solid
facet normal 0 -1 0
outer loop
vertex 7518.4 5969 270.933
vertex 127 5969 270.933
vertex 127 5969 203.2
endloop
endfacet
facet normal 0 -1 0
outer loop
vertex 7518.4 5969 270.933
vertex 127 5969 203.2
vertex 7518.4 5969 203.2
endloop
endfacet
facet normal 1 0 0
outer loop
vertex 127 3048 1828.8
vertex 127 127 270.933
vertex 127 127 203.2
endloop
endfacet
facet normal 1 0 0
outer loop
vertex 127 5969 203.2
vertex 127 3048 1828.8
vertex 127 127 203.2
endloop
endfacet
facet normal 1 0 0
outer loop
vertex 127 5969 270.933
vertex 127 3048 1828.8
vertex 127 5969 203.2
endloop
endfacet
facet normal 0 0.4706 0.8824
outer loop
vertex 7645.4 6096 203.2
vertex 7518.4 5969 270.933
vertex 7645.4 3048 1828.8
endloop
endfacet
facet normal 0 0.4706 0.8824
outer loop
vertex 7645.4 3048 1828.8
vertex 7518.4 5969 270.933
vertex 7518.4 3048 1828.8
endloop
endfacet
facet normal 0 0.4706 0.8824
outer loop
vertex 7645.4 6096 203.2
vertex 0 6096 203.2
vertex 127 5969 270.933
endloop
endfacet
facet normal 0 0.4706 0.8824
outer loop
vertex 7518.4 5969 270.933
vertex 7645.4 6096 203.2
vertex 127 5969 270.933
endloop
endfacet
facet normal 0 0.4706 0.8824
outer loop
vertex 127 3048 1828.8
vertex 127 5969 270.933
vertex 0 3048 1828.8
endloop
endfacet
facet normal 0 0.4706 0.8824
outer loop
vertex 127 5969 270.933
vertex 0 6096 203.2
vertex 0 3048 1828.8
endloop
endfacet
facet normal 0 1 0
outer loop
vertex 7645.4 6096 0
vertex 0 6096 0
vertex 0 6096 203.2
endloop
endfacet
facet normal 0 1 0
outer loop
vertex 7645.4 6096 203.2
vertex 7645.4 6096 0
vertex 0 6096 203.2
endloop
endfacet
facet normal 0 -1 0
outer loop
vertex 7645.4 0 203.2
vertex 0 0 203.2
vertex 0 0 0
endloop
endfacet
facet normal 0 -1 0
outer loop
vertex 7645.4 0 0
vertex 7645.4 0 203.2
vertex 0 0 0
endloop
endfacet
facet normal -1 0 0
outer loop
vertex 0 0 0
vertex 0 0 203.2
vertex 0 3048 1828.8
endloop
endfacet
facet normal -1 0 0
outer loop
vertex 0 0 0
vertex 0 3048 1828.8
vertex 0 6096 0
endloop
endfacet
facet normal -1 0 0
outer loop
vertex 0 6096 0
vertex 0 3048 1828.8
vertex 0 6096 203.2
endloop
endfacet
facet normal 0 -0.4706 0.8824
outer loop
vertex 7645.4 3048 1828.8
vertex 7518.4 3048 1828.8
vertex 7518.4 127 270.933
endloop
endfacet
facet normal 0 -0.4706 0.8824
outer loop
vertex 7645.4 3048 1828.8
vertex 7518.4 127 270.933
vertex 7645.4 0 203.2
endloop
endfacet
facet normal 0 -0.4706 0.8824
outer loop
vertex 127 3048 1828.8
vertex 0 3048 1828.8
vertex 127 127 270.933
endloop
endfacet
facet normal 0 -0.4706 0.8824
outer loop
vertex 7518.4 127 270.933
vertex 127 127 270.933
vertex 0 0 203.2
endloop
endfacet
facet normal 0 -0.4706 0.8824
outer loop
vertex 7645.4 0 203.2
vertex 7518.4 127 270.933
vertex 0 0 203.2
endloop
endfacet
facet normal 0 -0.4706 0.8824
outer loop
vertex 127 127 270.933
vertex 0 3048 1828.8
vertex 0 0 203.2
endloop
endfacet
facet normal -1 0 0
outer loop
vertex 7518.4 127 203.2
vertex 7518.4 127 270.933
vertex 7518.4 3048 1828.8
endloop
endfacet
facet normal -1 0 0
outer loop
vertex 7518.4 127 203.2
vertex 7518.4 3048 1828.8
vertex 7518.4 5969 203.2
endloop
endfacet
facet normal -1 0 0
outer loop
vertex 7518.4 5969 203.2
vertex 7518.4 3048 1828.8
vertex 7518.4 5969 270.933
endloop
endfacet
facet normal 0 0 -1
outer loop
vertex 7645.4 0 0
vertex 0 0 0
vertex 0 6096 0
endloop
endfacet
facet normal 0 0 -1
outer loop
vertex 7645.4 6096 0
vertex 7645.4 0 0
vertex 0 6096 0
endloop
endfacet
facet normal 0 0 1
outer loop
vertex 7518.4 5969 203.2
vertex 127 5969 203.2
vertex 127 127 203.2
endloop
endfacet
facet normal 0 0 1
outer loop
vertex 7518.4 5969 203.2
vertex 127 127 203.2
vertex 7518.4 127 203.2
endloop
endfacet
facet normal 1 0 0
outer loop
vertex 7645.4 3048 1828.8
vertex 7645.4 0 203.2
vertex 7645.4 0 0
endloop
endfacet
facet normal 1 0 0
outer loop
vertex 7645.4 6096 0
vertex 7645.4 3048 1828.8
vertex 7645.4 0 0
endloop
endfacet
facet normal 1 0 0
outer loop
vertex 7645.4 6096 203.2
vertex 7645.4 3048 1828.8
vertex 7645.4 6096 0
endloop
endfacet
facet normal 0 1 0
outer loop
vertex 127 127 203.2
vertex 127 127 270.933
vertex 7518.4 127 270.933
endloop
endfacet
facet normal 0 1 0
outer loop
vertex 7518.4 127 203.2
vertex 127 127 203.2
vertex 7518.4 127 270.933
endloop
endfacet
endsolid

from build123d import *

# Parameters (mm, degrees)
F2_DEPTH = 7645.4
F3_W     = 7391.4
F3_H     = 5842
F4_DEPTH = 1625.6


with BuildPart() as f2:
    # F1 (on Right) → F2 (new body)
    with BuildSketch(Plane.YZ):
        Polygon((0, 203.2), (0, 0), (6096, 0), (6096, 203.2), (3048, 1828.8), align=None)
    extrude(amount=F2_DEPTH)

    # F3 (on offset) → F4 (cut)
    with BuildSketch(Plane.XY.offset(1828.8)):
        with Locations((3822.7, 3048)):
            Rectangle(F3_W, F3_H)
    extrude(amount=-F4_DEPTH, mode=Mode.SUBTRACT)


solid = f2.part
